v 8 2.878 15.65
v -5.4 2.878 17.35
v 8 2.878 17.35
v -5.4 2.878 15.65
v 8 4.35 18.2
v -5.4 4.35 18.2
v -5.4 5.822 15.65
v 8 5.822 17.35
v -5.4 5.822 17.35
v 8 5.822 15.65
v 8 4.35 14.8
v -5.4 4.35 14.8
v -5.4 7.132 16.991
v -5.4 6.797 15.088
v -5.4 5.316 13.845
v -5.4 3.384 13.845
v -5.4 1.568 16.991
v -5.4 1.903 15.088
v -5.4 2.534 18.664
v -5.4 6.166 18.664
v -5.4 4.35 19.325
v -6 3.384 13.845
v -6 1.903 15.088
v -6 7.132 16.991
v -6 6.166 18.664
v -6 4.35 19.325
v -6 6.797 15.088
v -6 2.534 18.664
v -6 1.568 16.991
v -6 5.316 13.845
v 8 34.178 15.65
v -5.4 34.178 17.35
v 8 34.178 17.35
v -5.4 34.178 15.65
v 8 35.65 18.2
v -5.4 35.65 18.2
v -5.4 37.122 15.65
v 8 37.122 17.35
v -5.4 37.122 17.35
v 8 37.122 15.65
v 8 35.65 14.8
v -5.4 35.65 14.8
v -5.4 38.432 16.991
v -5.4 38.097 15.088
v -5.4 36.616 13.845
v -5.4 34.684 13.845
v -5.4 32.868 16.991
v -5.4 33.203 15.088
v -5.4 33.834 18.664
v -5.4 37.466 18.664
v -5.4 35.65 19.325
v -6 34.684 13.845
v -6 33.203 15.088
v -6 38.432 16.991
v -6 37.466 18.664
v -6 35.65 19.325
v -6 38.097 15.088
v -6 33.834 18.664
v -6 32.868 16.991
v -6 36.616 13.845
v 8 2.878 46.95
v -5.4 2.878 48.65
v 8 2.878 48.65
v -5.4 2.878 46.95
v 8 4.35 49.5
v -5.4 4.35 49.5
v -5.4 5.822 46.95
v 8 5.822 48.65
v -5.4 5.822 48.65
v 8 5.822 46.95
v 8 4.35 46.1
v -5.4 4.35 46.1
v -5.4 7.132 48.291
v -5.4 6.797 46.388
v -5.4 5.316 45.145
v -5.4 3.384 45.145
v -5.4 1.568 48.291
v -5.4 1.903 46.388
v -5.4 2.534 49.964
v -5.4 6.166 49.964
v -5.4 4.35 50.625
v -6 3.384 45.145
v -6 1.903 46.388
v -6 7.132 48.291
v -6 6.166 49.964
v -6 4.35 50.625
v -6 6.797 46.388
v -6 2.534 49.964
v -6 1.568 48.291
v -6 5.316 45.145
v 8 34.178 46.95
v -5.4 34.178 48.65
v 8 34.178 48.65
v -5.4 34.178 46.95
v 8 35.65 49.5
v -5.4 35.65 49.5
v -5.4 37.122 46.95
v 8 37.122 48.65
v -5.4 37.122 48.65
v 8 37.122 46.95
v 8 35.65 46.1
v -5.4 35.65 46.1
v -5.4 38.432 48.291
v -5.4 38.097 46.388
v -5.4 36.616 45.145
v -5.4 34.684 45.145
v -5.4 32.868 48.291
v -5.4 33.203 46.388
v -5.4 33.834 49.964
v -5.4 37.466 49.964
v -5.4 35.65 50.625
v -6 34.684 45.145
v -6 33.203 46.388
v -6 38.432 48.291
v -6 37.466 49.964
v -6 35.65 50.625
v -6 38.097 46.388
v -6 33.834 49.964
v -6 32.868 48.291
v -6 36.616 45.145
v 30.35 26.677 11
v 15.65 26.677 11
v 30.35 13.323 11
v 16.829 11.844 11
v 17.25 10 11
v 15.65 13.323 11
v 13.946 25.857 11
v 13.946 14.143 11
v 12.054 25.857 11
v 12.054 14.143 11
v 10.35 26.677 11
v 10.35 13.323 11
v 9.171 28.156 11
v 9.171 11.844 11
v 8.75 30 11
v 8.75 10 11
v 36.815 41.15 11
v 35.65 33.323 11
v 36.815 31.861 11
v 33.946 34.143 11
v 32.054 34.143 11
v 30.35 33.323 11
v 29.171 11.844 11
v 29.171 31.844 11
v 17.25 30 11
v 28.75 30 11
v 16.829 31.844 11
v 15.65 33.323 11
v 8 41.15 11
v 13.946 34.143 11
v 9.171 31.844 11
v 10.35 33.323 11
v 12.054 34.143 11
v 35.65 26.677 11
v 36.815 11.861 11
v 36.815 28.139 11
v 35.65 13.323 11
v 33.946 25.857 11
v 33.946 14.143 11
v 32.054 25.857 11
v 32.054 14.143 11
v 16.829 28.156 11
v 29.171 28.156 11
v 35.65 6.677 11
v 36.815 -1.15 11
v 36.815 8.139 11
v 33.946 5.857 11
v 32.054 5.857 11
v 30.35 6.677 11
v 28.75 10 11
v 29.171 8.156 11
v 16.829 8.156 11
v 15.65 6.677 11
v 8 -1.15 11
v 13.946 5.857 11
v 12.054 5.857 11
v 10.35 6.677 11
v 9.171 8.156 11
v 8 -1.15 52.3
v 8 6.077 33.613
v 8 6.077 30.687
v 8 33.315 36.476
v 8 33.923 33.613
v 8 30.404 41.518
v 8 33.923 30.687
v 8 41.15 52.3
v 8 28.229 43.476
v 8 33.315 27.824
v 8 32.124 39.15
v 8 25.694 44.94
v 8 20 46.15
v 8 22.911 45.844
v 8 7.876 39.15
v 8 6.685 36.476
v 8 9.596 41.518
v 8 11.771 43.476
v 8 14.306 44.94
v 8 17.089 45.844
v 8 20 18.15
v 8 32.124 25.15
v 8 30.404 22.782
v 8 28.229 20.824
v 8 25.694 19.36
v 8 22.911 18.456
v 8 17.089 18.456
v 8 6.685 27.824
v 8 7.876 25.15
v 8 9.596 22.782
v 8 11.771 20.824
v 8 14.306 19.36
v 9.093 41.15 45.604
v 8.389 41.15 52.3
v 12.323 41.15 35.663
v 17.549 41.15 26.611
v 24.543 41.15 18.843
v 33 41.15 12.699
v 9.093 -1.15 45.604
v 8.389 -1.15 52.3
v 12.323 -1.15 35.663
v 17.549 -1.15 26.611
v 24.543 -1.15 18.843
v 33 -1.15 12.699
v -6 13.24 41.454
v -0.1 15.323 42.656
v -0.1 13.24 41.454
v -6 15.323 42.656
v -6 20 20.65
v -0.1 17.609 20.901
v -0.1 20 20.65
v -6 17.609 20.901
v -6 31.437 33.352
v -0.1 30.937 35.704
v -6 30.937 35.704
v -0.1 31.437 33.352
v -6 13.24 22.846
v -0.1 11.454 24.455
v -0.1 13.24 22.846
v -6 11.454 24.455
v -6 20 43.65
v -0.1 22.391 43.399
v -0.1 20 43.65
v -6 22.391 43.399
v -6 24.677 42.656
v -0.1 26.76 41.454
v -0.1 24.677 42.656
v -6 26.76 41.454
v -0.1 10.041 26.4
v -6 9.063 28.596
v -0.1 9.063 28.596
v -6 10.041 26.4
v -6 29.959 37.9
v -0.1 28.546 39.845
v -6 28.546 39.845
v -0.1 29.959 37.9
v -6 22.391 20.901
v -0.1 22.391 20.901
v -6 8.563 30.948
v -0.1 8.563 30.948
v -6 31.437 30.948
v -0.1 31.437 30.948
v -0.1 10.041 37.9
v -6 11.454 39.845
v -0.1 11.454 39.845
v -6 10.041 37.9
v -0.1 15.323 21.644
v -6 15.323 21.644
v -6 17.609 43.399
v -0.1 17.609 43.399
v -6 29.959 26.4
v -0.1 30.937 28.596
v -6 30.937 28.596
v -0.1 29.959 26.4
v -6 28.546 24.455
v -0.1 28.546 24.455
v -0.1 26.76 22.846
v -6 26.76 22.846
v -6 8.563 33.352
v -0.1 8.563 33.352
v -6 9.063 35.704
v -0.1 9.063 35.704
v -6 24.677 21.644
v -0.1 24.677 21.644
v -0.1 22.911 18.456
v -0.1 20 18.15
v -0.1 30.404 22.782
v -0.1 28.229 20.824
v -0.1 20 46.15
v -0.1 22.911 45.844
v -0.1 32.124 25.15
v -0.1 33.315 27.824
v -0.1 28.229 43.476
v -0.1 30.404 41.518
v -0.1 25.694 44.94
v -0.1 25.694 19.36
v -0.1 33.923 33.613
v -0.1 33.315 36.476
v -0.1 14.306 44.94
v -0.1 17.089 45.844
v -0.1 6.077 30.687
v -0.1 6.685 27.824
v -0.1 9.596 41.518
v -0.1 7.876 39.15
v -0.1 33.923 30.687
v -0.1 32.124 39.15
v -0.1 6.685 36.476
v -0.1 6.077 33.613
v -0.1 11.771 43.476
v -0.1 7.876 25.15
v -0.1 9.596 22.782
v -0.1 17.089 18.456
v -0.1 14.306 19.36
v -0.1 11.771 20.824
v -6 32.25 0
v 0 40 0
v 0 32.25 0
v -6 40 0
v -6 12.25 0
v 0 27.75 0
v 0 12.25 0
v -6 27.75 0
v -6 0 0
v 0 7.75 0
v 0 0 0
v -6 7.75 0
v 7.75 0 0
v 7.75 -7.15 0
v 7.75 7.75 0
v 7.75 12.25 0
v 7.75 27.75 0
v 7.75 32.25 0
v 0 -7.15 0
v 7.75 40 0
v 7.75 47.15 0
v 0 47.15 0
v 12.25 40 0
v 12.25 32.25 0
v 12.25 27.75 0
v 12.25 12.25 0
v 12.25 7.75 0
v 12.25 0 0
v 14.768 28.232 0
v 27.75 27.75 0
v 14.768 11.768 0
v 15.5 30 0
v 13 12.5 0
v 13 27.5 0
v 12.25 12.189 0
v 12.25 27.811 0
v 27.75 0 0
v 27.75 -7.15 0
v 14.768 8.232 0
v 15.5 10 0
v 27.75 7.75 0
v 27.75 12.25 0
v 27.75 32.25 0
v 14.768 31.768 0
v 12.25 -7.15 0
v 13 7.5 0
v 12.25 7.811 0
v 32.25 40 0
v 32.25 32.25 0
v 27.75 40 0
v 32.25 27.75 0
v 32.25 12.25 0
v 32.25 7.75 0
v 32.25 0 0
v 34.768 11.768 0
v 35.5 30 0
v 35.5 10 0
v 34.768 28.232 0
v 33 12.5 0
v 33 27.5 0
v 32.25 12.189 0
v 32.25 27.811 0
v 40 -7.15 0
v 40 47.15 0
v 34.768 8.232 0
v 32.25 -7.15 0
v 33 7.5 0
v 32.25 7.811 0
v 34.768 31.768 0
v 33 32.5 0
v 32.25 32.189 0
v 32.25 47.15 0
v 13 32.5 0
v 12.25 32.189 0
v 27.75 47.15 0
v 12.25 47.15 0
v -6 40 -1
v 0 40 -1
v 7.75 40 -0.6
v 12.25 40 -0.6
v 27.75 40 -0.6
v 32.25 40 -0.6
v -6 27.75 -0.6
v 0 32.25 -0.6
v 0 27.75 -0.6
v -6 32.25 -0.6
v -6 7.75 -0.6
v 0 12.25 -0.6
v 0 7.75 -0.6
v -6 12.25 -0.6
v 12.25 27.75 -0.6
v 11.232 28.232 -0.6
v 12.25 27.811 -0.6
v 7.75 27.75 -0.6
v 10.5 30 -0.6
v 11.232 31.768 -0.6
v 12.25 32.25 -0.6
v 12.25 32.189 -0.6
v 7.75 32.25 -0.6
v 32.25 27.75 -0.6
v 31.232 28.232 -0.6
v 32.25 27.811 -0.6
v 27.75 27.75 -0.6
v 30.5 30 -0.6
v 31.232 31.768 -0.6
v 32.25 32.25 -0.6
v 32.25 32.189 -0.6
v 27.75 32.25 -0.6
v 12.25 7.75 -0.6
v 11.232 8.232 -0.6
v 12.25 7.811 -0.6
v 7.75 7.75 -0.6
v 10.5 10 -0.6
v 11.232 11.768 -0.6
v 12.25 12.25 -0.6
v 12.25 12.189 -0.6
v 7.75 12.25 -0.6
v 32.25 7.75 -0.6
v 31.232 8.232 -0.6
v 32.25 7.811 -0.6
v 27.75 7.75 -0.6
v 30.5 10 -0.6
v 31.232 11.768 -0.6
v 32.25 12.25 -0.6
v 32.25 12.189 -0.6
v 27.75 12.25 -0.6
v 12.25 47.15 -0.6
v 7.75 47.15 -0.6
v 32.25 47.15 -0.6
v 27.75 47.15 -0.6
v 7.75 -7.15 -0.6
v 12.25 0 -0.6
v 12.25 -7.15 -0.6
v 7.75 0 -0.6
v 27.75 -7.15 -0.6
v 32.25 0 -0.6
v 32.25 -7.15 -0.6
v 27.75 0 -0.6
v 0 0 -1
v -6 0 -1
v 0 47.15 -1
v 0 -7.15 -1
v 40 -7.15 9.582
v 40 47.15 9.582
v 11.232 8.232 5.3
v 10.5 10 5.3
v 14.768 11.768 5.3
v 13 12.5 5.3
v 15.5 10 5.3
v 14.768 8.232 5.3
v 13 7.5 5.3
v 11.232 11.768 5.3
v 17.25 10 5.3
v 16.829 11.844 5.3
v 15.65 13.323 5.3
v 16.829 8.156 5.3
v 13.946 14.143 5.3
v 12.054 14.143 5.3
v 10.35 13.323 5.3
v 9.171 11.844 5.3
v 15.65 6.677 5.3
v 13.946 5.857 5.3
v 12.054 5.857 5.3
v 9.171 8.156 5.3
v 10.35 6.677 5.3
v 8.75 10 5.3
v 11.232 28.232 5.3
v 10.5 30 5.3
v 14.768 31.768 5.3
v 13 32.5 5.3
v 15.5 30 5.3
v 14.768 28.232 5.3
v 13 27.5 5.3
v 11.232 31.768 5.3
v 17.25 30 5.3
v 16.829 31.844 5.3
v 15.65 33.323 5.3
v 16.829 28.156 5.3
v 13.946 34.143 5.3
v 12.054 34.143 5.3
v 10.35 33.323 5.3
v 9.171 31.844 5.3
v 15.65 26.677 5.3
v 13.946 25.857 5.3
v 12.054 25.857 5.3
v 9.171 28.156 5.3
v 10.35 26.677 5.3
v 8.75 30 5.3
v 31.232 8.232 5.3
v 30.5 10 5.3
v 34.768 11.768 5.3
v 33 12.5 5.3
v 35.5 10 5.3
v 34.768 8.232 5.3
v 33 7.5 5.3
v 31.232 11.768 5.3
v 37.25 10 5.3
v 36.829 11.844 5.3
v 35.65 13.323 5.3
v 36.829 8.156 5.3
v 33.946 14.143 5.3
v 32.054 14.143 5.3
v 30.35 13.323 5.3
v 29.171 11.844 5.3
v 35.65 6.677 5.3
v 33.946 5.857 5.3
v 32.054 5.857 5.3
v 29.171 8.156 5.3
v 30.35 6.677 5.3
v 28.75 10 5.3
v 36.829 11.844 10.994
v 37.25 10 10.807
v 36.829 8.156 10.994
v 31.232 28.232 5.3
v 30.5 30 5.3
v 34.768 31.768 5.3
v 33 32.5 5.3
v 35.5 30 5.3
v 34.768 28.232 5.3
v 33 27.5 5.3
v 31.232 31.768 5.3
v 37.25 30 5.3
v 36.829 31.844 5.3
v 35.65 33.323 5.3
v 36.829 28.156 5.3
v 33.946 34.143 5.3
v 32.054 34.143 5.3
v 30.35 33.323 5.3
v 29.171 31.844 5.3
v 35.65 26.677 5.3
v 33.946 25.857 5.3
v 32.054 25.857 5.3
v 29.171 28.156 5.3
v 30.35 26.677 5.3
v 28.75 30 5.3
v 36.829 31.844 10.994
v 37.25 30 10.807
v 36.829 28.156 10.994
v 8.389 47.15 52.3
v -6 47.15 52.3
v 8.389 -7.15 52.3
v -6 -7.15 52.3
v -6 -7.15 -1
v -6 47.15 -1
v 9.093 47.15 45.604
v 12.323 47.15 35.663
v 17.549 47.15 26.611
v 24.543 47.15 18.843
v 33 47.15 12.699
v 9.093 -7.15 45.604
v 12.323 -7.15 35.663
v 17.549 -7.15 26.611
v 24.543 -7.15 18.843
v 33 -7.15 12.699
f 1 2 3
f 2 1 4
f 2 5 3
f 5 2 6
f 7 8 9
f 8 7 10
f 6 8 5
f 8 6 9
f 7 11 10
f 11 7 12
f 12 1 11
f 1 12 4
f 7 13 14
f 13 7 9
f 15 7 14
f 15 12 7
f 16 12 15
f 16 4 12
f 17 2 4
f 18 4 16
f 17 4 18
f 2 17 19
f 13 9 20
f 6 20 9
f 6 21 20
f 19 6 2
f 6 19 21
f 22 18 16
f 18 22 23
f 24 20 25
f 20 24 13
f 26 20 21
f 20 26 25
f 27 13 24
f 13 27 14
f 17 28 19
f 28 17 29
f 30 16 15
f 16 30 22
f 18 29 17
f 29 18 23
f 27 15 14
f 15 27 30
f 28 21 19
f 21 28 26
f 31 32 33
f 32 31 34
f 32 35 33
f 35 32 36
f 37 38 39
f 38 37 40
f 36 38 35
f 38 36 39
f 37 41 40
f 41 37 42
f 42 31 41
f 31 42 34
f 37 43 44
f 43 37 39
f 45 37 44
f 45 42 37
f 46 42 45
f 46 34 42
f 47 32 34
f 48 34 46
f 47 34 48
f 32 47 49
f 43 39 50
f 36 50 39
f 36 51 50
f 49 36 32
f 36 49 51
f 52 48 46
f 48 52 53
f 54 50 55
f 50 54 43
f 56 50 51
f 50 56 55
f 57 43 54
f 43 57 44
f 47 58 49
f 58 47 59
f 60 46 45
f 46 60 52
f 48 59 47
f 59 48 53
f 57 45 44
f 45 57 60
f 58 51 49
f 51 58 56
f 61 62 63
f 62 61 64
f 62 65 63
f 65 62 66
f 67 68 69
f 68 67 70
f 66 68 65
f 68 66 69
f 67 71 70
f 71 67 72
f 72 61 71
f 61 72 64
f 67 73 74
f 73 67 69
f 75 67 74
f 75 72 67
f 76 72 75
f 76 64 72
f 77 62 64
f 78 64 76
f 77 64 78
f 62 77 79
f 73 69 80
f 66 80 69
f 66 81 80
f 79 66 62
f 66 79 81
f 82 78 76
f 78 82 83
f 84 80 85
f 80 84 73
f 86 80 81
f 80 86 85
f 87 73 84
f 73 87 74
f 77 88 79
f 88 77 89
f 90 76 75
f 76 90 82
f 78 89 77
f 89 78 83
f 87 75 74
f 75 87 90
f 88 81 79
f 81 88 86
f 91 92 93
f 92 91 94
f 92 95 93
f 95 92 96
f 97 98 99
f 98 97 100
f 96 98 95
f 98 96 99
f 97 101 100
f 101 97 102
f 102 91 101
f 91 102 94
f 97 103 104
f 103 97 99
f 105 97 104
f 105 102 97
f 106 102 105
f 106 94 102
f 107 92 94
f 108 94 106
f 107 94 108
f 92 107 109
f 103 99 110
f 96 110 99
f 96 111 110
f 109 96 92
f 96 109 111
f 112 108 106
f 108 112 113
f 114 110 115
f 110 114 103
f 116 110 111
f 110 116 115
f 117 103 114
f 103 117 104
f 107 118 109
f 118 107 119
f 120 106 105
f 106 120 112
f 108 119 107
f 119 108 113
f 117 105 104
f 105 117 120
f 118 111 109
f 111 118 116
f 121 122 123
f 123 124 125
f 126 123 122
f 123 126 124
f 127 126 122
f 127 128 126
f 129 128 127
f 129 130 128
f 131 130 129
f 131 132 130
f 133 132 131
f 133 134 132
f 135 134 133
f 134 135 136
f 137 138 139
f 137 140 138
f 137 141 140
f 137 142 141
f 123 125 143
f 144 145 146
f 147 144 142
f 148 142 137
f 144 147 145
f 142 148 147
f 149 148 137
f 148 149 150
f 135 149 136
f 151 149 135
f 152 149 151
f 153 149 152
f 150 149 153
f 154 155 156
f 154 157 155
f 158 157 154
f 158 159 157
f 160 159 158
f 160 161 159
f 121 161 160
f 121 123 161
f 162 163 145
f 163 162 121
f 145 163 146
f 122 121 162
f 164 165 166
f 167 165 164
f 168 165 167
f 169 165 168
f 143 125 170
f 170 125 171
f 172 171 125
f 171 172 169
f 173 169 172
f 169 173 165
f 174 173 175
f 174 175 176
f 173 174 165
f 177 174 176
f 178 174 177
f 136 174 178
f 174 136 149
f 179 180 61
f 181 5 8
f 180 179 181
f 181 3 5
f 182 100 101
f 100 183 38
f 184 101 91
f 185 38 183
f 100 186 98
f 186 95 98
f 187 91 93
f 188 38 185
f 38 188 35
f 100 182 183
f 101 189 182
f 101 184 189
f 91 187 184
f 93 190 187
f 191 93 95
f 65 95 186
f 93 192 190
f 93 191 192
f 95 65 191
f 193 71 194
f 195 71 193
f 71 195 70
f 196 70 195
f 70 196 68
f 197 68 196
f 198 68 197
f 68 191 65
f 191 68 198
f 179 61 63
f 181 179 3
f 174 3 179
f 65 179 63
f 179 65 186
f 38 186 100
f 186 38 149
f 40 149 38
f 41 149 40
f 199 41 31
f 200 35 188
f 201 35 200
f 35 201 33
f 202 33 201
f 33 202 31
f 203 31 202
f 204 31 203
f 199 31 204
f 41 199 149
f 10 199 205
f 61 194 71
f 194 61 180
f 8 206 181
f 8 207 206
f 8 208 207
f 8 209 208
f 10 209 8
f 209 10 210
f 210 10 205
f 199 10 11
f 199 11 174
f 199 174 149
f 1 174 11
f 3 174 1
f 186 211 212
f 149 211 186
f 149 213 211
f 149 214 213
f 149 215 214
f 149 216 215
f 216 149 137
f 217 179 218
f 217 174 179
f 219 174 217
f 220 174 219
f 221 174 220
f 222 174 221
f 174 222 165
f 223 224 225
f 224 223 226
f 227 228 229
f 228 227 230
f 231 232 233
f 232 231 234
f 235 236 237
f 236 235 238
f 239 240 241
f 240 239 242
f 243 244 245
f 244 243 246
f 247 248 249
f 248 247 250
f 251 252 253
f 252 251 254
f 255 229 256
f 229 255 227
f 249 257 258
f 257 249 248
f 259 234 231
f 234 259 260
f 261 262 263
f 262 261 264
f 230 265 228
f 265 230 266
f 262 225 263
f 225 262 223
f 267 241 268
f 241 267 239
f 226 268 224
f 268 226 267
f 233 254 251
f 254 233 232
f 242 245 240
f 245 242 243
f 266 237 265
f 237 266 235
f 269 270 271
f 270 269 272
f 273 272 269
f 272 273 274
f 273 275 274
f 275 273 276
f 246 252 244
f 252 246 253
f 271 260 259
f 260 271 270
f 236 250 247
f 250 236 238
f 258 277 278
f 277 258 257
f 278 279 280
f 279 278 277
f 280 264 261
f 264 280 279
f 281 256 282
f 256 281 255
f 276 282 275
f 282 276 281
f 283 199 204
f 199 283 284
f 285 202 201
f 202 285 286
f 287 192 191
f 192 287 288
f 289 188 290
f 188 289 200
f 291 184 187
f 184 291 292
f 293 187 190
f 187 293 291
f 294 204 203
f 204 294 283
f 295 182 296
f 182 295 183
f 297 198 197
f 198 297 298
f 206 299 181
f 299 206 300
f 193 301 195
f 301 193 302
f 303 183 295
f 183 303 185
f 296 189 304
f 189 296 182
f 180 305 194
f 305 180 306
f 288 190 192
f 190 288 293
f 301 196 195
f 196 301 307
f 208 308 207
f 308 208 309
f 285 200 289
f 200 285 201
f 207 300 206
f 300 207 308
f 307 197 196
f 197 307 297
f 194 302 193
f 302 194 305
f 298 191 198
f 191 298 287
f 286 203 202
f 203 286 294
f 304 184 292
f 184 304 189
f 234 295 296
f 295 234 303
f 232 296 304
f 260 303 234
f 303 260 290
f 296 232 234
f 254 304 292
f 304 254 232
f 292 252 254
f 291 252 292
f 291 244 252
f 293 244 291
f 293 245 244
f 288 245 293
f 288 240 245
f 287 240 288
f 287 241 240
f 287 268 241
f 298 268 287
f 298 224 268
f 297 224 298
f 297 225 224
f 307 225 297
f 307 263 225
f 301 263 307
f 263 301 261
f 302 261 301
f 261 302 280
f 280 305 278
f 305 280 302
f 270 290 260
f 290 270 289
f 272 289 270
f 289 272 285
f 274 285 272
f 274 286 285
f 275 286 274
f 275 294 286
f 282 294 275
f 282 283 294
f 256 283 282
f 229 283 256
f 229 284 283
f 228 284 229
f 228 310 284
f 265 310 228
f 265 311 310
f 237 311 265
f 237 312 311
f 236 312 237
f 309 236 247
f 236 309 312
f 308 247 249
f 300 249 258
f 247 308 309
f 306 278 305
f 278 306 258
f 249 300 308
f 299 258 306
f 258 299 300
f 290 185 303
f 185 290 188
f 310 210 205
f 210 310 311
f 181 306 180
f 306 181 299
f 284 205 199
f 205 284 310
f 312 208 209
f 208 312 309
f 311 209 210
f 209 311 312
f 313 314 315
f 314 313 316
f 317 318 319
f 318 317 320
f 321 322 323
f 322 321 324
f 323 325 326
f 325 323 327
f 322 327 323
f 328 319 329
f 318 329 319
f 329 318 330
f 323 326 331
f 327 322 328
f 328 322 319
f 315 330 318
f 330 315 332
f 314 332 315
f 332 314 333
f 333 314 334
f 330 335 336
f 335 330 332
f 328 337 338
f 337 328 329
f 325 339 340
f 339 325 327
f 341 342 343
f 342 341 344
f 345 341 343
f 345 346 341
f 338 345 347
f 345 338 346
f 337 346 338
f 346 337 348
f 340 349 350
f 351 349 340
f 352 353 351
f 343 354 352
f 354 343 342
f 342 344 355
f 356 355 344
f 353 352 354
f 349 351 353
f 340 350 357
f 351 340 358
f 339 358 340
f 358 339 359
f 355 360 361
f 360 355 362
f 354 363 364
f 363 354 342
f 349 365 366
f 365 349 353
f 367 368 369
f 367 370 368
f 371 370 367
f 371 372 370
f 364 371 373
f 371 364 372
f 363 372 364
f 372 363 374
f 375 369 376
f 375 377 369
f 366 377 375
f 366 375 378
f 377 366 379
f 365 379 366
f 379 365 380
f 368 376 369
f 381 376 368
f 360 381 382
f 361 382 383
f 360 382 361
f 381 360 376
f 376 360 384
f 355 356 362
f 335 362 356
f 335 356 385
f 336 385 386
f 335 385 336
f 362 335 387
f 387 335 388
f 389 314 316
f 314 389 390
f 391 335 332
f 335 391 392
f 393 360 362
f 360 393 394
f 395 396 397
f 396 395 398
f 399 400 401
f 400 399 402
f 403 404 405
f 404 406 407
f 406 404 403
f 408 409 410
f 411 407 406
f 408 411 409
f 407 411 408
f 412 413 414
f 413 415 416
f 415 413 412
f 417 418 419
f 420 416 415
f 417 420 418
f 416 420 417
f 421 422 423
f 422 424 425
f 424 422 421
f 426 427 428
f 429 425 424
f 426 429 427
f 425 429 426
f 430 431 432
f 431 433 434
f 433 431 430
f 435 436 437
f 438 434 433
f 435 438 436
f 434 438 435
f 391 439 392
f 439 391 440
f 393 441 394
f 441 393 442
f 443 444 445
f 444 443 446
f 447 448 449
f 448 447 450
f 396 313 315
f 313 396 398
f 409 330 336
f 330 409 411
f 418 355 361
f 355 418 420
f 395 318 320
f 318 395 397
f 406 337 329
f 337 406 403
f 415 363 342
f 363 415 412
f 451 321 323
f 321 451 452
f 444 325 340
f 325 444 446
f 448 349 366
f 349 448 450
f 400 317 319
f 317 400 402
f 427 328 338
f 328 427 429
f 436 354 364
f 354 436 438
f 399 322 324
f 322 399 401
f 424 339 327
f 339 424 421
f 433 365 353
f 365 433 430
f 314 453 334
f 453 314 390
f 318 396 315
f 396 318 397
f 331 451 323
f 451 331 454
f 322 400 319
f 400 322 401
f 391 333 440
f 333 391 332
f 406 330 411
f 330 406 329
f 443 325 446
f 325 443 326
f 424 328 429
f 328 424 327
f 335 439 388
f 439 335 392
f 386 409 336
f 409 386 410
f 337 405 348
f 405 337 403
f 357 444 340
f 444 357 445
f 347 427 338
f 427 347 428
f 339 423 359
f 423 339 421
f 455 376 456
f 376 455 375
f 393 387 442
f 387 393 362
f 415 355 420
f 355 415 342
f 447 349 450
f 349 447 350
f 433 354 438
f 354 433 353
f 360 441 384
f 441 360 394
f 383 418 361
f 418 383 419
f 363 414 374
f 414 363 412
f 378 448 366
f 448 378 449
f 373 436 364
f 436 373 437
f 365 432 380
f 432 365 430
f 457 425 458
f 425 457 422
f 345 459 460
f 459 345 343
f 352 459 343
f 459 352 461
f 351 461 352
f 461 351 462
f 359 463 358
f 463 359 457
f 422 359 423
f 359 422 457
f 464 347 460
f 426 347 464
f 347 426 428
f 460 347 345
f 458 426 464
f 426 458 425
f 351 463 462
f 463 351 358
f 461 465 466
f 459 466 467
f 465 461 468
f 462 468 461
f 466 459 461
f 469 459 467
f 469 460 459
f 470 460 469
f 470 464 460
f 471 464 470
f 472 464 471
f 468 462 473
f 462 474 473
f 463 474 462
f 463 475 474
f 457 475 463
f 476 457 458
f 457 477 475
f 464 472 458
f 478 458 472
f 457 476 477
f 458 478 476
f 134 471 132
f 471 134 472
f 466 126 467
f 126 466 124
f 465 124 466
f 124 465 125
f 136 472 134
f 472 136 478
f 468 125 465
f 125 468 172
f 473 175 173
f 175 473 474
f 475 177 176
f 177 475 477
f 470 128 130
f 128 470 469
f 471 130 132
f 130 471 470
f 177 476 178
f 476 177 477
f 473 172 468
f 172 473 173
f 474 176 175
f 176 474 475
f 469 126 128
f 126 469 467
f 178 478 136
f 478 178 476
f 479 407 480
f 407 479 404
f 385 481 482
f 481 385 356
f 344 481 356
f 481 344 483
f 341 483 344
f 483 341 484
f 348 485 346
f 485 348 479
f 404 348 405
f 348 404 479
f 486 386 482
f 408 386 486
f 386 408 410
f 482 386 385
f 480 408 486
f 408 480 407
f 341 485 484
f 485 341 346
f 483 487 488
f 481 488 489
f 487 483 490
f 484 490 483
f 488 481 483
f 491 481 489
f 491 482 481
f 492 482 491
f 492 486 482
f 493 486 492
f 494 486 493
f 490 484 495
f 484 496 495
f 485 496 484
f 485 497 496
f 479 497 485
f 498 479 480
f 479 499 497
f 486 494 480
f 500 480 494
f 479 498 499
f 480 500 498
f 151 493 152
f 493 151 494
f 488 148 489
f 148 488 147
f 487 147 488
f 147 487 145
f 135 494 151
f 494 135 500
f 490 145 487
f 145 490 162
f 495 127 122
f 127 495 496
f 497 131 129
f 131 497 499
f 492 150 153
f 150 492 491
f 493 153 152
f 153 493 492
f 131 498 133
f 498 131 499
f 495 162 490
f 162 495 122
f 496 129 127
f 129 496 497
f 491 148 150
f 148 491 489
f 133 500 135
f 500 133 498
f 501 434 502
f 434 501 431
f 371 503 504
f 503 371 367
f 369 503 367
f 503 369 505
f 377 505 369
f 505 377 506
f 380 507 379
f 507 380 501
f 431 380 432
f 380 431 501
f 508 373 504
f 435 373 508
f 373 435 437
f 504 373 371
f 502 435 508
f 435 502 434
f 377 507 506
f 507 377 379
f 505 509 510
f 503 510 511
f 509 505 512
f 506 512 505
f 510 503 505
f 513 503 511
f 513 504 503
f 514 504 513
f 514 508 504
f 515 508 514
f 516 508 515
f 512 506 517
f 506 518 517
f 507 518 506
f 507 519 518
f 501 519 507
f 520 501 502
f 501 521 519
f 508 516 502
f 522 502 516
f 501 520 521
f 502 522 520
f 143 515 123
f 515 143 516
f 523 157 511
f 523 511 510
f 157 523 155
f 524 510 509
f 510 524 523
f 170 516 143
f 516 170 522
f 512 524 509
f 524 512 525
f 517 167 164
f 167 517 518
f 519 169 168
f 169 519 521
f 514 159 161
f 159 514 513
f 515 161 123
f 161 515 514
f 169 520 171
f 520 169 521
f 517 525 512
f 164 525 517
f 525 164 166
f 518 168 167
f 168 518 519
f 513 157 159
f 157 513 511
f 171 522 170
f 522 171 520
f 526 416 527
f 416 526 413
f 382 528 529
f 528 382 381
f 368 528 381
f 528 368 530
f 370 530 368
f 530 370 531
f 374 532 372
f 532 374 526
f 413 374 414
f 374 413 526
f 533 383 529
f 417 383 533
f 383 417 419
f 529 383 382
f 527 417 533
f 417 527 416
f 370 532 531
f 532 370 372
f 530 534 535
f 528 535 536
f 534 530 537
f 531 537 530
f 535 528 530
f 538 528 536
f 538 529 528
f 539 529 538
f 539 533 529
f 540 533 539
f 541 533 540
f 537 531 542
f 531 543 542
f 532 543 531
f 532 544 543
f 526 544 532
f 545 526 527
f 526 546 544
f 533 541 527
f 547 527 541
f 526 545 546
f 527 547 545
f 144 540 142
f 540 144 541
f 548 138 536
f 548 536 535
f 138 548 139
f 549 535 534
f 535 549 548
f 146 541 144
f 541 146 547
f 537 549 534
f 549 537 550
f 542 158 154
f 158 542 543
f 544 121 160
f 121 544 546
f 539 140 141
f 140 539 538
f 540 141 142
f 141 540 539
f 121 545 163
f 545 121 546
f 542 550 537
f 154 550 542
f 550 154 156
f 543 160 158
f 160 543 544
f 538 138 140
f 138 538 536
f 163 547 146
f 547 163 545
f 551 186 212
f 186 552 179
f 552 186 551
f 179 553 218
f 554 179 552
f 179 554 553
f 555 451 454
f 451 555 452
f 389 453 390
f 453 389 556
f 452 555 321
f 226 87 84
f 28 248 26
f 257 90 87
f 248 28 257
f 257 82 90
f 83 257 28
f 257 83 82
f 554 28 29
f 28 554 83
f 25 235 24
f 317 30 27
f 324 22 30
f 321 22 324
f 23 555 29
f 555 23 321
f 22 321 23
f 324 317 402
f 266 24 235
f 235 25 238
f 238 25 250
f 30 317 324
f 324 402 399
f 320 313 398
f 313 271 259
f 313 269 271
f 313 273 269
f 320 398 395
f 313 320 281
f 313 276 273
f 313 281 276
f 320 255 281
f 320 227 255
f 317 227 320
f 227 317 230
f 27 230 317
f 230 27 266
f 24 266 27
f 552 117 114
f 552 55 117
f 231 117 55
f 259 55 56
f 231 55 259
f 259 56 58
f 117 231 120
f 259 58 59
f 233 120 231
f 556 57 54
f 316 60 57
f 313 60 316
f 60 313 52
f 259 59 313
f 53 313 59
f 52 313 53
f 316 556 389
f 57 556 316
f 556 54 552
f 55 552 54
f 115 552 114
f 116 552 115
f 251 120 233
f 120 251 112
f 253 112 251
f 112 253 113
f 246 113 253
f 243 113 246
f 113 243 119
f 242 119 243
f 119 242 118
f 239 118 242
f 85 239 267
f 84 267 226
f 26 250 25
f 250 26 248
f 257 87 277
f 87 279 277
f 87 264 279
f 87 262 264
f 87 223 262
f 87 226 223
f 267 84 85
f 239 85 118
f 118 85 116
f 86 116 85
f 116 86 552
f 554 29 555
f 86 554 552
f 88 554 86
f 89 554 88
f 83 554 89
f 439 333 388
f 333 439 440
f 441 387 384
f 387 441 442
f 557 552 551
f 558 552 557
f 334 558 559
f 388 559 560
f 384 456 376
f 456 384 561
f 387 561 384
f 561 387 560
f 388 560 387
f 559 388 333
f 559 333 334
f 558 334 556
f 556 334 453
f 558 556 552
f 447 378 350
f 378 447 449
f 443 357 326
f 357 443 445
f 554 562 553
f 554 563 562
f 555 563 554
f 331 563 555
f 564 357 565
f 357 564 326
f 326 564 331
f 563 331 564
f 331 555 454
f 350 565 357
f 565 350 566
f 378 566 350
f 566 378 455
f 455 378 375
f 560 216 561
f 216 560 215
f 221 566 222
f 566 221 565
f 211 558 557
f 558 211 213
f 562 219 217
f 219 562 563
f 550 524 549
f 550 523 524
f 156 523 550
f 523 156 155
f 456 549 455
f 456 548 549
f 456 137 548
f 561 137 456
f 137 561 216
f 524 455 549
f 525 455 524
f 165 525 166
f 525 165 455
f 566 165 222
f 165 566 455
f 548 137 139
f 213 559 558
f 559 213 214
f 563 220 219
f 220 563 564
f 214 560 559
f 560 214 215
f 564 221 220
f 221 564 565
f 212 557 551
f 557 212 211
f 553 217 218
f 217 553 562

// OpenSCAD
wallThickness = 6;

nema17Width=42.30;
slotWidth=4.5;
slotHeight=0.6;

nutDiameter=23;
nutRaduis=nutDiameter/2;
bearingDiameter=28;
bearingRadius=bearingDiameter/2;
bearingThickness=8;

difference(){
	translate([-wallThickness,-(nema17Width-40)/2-wallThickness,-1])cube([40+wallThickness,nema17Width+(wallThickness*2),nema17Width+wallThickness+5]);
	translate([0,-(nema17Width-40)/2,wallThickness+5])bigBearing();
	translate([-100,0,-40])profile5_40x40(200);
	rotate([0,0,90])translate([-100,-40,-40])profile5_40x40(200);
	translate([13,10,-slotHeight-0.1])m5Screw(6,6);
	#translate([13,30,-slotHeight-0.1])m5Screw(6,6);
	translate([33,10,-slotHeight-0.1])m5Screw(6,6);
	translate([33,30,-slotHeight-0.1])m5Screw(6,6);
	translate([50+bearingThickness,50,56])rotate([90,0,0])cylinder(h=60,r=50);
}

module bigBearing(){
	union(){
		translate([bearingThickness,0,0])cube([60,nema17Width,nema17Width]);
		translate([0,nema17Width/2,nema17Width/2])rotate([0,-90,0])cylinder(h=22,r=6/2);
		translate([bearingThickness+0.1,nema17Width/2,nema17Width/2])rotate([0,-90,0])cylinder(h=0.2+wallThickness+bearingThickness,r=nutRaduis);
		translate([bearingThickness+0.1,nema17Width/2,nema17Width/2])rotate([0,-90,0])cylinder(h=0.2+bearingThickness,r=bearingRadius);
		translate([0.1+bearingThickness,5.5,5.5])rotate([0,-90,0])m3Screw(5.5+bearingThickness,40);
		translate([0.1+bearingThickness,nema17Width-5.5,5.5])rotate([0,-90,0])m3Screw(5.5+bearingThickness,40);
		translate([0.1+bearingThickness,5.5,nema17Width-5.5])rotate([0,-90,0])m3Screw(5.5+bearingThickness,40);
		translate([0.1+bearingThickness,nema17Width-5.5,nema17Width-5.5])rotate([0,-90,0])m3Screw(5.5+bearingThickness,40);
	}
}

module m3Screw(h=10,headH=3) {
	union() {
		cylinder(h=h,r=1.7);
		translate([0,0,h])cylinder(h=headH,r=5.65/2);
	}
}

module m5Screw(h=10,headH=5.5) {
	union() {
		cylinder(h=h,r=2.5);
		translate([0,0,h])cylinder(h=headH,r=4.25);
	}
}

module profile5_20x20(l=100) {
	difference(){
		cube([l,20,20]);
		translate([0,(20/2)-slotWidth/2,0])cube([l,slotWidth,slotHeight]);
		translate([0,(20/2)-slotWidth/2,20-slotHeight])cube([l,slotWidth,slotHeight]);
		translate([0,0,(20/2)-(slotWidth/2)])cube([l,slotHeight,slotWidth]);
		translate([0,20-slotHeight,(20/2)-(slotWidth/2)])cube([l,slotHeight,slotWidth]);
		
	}
	
}

module profile5_40x40(l=100) {
	union(){
		profile5_20x20(l);
		translate([0,20,0])profile5_20x20(l);
		translate([0,20,20])profile5_20x20(l);
		translate([0,0,20])profile5_20x20(l);
	}
	
}
